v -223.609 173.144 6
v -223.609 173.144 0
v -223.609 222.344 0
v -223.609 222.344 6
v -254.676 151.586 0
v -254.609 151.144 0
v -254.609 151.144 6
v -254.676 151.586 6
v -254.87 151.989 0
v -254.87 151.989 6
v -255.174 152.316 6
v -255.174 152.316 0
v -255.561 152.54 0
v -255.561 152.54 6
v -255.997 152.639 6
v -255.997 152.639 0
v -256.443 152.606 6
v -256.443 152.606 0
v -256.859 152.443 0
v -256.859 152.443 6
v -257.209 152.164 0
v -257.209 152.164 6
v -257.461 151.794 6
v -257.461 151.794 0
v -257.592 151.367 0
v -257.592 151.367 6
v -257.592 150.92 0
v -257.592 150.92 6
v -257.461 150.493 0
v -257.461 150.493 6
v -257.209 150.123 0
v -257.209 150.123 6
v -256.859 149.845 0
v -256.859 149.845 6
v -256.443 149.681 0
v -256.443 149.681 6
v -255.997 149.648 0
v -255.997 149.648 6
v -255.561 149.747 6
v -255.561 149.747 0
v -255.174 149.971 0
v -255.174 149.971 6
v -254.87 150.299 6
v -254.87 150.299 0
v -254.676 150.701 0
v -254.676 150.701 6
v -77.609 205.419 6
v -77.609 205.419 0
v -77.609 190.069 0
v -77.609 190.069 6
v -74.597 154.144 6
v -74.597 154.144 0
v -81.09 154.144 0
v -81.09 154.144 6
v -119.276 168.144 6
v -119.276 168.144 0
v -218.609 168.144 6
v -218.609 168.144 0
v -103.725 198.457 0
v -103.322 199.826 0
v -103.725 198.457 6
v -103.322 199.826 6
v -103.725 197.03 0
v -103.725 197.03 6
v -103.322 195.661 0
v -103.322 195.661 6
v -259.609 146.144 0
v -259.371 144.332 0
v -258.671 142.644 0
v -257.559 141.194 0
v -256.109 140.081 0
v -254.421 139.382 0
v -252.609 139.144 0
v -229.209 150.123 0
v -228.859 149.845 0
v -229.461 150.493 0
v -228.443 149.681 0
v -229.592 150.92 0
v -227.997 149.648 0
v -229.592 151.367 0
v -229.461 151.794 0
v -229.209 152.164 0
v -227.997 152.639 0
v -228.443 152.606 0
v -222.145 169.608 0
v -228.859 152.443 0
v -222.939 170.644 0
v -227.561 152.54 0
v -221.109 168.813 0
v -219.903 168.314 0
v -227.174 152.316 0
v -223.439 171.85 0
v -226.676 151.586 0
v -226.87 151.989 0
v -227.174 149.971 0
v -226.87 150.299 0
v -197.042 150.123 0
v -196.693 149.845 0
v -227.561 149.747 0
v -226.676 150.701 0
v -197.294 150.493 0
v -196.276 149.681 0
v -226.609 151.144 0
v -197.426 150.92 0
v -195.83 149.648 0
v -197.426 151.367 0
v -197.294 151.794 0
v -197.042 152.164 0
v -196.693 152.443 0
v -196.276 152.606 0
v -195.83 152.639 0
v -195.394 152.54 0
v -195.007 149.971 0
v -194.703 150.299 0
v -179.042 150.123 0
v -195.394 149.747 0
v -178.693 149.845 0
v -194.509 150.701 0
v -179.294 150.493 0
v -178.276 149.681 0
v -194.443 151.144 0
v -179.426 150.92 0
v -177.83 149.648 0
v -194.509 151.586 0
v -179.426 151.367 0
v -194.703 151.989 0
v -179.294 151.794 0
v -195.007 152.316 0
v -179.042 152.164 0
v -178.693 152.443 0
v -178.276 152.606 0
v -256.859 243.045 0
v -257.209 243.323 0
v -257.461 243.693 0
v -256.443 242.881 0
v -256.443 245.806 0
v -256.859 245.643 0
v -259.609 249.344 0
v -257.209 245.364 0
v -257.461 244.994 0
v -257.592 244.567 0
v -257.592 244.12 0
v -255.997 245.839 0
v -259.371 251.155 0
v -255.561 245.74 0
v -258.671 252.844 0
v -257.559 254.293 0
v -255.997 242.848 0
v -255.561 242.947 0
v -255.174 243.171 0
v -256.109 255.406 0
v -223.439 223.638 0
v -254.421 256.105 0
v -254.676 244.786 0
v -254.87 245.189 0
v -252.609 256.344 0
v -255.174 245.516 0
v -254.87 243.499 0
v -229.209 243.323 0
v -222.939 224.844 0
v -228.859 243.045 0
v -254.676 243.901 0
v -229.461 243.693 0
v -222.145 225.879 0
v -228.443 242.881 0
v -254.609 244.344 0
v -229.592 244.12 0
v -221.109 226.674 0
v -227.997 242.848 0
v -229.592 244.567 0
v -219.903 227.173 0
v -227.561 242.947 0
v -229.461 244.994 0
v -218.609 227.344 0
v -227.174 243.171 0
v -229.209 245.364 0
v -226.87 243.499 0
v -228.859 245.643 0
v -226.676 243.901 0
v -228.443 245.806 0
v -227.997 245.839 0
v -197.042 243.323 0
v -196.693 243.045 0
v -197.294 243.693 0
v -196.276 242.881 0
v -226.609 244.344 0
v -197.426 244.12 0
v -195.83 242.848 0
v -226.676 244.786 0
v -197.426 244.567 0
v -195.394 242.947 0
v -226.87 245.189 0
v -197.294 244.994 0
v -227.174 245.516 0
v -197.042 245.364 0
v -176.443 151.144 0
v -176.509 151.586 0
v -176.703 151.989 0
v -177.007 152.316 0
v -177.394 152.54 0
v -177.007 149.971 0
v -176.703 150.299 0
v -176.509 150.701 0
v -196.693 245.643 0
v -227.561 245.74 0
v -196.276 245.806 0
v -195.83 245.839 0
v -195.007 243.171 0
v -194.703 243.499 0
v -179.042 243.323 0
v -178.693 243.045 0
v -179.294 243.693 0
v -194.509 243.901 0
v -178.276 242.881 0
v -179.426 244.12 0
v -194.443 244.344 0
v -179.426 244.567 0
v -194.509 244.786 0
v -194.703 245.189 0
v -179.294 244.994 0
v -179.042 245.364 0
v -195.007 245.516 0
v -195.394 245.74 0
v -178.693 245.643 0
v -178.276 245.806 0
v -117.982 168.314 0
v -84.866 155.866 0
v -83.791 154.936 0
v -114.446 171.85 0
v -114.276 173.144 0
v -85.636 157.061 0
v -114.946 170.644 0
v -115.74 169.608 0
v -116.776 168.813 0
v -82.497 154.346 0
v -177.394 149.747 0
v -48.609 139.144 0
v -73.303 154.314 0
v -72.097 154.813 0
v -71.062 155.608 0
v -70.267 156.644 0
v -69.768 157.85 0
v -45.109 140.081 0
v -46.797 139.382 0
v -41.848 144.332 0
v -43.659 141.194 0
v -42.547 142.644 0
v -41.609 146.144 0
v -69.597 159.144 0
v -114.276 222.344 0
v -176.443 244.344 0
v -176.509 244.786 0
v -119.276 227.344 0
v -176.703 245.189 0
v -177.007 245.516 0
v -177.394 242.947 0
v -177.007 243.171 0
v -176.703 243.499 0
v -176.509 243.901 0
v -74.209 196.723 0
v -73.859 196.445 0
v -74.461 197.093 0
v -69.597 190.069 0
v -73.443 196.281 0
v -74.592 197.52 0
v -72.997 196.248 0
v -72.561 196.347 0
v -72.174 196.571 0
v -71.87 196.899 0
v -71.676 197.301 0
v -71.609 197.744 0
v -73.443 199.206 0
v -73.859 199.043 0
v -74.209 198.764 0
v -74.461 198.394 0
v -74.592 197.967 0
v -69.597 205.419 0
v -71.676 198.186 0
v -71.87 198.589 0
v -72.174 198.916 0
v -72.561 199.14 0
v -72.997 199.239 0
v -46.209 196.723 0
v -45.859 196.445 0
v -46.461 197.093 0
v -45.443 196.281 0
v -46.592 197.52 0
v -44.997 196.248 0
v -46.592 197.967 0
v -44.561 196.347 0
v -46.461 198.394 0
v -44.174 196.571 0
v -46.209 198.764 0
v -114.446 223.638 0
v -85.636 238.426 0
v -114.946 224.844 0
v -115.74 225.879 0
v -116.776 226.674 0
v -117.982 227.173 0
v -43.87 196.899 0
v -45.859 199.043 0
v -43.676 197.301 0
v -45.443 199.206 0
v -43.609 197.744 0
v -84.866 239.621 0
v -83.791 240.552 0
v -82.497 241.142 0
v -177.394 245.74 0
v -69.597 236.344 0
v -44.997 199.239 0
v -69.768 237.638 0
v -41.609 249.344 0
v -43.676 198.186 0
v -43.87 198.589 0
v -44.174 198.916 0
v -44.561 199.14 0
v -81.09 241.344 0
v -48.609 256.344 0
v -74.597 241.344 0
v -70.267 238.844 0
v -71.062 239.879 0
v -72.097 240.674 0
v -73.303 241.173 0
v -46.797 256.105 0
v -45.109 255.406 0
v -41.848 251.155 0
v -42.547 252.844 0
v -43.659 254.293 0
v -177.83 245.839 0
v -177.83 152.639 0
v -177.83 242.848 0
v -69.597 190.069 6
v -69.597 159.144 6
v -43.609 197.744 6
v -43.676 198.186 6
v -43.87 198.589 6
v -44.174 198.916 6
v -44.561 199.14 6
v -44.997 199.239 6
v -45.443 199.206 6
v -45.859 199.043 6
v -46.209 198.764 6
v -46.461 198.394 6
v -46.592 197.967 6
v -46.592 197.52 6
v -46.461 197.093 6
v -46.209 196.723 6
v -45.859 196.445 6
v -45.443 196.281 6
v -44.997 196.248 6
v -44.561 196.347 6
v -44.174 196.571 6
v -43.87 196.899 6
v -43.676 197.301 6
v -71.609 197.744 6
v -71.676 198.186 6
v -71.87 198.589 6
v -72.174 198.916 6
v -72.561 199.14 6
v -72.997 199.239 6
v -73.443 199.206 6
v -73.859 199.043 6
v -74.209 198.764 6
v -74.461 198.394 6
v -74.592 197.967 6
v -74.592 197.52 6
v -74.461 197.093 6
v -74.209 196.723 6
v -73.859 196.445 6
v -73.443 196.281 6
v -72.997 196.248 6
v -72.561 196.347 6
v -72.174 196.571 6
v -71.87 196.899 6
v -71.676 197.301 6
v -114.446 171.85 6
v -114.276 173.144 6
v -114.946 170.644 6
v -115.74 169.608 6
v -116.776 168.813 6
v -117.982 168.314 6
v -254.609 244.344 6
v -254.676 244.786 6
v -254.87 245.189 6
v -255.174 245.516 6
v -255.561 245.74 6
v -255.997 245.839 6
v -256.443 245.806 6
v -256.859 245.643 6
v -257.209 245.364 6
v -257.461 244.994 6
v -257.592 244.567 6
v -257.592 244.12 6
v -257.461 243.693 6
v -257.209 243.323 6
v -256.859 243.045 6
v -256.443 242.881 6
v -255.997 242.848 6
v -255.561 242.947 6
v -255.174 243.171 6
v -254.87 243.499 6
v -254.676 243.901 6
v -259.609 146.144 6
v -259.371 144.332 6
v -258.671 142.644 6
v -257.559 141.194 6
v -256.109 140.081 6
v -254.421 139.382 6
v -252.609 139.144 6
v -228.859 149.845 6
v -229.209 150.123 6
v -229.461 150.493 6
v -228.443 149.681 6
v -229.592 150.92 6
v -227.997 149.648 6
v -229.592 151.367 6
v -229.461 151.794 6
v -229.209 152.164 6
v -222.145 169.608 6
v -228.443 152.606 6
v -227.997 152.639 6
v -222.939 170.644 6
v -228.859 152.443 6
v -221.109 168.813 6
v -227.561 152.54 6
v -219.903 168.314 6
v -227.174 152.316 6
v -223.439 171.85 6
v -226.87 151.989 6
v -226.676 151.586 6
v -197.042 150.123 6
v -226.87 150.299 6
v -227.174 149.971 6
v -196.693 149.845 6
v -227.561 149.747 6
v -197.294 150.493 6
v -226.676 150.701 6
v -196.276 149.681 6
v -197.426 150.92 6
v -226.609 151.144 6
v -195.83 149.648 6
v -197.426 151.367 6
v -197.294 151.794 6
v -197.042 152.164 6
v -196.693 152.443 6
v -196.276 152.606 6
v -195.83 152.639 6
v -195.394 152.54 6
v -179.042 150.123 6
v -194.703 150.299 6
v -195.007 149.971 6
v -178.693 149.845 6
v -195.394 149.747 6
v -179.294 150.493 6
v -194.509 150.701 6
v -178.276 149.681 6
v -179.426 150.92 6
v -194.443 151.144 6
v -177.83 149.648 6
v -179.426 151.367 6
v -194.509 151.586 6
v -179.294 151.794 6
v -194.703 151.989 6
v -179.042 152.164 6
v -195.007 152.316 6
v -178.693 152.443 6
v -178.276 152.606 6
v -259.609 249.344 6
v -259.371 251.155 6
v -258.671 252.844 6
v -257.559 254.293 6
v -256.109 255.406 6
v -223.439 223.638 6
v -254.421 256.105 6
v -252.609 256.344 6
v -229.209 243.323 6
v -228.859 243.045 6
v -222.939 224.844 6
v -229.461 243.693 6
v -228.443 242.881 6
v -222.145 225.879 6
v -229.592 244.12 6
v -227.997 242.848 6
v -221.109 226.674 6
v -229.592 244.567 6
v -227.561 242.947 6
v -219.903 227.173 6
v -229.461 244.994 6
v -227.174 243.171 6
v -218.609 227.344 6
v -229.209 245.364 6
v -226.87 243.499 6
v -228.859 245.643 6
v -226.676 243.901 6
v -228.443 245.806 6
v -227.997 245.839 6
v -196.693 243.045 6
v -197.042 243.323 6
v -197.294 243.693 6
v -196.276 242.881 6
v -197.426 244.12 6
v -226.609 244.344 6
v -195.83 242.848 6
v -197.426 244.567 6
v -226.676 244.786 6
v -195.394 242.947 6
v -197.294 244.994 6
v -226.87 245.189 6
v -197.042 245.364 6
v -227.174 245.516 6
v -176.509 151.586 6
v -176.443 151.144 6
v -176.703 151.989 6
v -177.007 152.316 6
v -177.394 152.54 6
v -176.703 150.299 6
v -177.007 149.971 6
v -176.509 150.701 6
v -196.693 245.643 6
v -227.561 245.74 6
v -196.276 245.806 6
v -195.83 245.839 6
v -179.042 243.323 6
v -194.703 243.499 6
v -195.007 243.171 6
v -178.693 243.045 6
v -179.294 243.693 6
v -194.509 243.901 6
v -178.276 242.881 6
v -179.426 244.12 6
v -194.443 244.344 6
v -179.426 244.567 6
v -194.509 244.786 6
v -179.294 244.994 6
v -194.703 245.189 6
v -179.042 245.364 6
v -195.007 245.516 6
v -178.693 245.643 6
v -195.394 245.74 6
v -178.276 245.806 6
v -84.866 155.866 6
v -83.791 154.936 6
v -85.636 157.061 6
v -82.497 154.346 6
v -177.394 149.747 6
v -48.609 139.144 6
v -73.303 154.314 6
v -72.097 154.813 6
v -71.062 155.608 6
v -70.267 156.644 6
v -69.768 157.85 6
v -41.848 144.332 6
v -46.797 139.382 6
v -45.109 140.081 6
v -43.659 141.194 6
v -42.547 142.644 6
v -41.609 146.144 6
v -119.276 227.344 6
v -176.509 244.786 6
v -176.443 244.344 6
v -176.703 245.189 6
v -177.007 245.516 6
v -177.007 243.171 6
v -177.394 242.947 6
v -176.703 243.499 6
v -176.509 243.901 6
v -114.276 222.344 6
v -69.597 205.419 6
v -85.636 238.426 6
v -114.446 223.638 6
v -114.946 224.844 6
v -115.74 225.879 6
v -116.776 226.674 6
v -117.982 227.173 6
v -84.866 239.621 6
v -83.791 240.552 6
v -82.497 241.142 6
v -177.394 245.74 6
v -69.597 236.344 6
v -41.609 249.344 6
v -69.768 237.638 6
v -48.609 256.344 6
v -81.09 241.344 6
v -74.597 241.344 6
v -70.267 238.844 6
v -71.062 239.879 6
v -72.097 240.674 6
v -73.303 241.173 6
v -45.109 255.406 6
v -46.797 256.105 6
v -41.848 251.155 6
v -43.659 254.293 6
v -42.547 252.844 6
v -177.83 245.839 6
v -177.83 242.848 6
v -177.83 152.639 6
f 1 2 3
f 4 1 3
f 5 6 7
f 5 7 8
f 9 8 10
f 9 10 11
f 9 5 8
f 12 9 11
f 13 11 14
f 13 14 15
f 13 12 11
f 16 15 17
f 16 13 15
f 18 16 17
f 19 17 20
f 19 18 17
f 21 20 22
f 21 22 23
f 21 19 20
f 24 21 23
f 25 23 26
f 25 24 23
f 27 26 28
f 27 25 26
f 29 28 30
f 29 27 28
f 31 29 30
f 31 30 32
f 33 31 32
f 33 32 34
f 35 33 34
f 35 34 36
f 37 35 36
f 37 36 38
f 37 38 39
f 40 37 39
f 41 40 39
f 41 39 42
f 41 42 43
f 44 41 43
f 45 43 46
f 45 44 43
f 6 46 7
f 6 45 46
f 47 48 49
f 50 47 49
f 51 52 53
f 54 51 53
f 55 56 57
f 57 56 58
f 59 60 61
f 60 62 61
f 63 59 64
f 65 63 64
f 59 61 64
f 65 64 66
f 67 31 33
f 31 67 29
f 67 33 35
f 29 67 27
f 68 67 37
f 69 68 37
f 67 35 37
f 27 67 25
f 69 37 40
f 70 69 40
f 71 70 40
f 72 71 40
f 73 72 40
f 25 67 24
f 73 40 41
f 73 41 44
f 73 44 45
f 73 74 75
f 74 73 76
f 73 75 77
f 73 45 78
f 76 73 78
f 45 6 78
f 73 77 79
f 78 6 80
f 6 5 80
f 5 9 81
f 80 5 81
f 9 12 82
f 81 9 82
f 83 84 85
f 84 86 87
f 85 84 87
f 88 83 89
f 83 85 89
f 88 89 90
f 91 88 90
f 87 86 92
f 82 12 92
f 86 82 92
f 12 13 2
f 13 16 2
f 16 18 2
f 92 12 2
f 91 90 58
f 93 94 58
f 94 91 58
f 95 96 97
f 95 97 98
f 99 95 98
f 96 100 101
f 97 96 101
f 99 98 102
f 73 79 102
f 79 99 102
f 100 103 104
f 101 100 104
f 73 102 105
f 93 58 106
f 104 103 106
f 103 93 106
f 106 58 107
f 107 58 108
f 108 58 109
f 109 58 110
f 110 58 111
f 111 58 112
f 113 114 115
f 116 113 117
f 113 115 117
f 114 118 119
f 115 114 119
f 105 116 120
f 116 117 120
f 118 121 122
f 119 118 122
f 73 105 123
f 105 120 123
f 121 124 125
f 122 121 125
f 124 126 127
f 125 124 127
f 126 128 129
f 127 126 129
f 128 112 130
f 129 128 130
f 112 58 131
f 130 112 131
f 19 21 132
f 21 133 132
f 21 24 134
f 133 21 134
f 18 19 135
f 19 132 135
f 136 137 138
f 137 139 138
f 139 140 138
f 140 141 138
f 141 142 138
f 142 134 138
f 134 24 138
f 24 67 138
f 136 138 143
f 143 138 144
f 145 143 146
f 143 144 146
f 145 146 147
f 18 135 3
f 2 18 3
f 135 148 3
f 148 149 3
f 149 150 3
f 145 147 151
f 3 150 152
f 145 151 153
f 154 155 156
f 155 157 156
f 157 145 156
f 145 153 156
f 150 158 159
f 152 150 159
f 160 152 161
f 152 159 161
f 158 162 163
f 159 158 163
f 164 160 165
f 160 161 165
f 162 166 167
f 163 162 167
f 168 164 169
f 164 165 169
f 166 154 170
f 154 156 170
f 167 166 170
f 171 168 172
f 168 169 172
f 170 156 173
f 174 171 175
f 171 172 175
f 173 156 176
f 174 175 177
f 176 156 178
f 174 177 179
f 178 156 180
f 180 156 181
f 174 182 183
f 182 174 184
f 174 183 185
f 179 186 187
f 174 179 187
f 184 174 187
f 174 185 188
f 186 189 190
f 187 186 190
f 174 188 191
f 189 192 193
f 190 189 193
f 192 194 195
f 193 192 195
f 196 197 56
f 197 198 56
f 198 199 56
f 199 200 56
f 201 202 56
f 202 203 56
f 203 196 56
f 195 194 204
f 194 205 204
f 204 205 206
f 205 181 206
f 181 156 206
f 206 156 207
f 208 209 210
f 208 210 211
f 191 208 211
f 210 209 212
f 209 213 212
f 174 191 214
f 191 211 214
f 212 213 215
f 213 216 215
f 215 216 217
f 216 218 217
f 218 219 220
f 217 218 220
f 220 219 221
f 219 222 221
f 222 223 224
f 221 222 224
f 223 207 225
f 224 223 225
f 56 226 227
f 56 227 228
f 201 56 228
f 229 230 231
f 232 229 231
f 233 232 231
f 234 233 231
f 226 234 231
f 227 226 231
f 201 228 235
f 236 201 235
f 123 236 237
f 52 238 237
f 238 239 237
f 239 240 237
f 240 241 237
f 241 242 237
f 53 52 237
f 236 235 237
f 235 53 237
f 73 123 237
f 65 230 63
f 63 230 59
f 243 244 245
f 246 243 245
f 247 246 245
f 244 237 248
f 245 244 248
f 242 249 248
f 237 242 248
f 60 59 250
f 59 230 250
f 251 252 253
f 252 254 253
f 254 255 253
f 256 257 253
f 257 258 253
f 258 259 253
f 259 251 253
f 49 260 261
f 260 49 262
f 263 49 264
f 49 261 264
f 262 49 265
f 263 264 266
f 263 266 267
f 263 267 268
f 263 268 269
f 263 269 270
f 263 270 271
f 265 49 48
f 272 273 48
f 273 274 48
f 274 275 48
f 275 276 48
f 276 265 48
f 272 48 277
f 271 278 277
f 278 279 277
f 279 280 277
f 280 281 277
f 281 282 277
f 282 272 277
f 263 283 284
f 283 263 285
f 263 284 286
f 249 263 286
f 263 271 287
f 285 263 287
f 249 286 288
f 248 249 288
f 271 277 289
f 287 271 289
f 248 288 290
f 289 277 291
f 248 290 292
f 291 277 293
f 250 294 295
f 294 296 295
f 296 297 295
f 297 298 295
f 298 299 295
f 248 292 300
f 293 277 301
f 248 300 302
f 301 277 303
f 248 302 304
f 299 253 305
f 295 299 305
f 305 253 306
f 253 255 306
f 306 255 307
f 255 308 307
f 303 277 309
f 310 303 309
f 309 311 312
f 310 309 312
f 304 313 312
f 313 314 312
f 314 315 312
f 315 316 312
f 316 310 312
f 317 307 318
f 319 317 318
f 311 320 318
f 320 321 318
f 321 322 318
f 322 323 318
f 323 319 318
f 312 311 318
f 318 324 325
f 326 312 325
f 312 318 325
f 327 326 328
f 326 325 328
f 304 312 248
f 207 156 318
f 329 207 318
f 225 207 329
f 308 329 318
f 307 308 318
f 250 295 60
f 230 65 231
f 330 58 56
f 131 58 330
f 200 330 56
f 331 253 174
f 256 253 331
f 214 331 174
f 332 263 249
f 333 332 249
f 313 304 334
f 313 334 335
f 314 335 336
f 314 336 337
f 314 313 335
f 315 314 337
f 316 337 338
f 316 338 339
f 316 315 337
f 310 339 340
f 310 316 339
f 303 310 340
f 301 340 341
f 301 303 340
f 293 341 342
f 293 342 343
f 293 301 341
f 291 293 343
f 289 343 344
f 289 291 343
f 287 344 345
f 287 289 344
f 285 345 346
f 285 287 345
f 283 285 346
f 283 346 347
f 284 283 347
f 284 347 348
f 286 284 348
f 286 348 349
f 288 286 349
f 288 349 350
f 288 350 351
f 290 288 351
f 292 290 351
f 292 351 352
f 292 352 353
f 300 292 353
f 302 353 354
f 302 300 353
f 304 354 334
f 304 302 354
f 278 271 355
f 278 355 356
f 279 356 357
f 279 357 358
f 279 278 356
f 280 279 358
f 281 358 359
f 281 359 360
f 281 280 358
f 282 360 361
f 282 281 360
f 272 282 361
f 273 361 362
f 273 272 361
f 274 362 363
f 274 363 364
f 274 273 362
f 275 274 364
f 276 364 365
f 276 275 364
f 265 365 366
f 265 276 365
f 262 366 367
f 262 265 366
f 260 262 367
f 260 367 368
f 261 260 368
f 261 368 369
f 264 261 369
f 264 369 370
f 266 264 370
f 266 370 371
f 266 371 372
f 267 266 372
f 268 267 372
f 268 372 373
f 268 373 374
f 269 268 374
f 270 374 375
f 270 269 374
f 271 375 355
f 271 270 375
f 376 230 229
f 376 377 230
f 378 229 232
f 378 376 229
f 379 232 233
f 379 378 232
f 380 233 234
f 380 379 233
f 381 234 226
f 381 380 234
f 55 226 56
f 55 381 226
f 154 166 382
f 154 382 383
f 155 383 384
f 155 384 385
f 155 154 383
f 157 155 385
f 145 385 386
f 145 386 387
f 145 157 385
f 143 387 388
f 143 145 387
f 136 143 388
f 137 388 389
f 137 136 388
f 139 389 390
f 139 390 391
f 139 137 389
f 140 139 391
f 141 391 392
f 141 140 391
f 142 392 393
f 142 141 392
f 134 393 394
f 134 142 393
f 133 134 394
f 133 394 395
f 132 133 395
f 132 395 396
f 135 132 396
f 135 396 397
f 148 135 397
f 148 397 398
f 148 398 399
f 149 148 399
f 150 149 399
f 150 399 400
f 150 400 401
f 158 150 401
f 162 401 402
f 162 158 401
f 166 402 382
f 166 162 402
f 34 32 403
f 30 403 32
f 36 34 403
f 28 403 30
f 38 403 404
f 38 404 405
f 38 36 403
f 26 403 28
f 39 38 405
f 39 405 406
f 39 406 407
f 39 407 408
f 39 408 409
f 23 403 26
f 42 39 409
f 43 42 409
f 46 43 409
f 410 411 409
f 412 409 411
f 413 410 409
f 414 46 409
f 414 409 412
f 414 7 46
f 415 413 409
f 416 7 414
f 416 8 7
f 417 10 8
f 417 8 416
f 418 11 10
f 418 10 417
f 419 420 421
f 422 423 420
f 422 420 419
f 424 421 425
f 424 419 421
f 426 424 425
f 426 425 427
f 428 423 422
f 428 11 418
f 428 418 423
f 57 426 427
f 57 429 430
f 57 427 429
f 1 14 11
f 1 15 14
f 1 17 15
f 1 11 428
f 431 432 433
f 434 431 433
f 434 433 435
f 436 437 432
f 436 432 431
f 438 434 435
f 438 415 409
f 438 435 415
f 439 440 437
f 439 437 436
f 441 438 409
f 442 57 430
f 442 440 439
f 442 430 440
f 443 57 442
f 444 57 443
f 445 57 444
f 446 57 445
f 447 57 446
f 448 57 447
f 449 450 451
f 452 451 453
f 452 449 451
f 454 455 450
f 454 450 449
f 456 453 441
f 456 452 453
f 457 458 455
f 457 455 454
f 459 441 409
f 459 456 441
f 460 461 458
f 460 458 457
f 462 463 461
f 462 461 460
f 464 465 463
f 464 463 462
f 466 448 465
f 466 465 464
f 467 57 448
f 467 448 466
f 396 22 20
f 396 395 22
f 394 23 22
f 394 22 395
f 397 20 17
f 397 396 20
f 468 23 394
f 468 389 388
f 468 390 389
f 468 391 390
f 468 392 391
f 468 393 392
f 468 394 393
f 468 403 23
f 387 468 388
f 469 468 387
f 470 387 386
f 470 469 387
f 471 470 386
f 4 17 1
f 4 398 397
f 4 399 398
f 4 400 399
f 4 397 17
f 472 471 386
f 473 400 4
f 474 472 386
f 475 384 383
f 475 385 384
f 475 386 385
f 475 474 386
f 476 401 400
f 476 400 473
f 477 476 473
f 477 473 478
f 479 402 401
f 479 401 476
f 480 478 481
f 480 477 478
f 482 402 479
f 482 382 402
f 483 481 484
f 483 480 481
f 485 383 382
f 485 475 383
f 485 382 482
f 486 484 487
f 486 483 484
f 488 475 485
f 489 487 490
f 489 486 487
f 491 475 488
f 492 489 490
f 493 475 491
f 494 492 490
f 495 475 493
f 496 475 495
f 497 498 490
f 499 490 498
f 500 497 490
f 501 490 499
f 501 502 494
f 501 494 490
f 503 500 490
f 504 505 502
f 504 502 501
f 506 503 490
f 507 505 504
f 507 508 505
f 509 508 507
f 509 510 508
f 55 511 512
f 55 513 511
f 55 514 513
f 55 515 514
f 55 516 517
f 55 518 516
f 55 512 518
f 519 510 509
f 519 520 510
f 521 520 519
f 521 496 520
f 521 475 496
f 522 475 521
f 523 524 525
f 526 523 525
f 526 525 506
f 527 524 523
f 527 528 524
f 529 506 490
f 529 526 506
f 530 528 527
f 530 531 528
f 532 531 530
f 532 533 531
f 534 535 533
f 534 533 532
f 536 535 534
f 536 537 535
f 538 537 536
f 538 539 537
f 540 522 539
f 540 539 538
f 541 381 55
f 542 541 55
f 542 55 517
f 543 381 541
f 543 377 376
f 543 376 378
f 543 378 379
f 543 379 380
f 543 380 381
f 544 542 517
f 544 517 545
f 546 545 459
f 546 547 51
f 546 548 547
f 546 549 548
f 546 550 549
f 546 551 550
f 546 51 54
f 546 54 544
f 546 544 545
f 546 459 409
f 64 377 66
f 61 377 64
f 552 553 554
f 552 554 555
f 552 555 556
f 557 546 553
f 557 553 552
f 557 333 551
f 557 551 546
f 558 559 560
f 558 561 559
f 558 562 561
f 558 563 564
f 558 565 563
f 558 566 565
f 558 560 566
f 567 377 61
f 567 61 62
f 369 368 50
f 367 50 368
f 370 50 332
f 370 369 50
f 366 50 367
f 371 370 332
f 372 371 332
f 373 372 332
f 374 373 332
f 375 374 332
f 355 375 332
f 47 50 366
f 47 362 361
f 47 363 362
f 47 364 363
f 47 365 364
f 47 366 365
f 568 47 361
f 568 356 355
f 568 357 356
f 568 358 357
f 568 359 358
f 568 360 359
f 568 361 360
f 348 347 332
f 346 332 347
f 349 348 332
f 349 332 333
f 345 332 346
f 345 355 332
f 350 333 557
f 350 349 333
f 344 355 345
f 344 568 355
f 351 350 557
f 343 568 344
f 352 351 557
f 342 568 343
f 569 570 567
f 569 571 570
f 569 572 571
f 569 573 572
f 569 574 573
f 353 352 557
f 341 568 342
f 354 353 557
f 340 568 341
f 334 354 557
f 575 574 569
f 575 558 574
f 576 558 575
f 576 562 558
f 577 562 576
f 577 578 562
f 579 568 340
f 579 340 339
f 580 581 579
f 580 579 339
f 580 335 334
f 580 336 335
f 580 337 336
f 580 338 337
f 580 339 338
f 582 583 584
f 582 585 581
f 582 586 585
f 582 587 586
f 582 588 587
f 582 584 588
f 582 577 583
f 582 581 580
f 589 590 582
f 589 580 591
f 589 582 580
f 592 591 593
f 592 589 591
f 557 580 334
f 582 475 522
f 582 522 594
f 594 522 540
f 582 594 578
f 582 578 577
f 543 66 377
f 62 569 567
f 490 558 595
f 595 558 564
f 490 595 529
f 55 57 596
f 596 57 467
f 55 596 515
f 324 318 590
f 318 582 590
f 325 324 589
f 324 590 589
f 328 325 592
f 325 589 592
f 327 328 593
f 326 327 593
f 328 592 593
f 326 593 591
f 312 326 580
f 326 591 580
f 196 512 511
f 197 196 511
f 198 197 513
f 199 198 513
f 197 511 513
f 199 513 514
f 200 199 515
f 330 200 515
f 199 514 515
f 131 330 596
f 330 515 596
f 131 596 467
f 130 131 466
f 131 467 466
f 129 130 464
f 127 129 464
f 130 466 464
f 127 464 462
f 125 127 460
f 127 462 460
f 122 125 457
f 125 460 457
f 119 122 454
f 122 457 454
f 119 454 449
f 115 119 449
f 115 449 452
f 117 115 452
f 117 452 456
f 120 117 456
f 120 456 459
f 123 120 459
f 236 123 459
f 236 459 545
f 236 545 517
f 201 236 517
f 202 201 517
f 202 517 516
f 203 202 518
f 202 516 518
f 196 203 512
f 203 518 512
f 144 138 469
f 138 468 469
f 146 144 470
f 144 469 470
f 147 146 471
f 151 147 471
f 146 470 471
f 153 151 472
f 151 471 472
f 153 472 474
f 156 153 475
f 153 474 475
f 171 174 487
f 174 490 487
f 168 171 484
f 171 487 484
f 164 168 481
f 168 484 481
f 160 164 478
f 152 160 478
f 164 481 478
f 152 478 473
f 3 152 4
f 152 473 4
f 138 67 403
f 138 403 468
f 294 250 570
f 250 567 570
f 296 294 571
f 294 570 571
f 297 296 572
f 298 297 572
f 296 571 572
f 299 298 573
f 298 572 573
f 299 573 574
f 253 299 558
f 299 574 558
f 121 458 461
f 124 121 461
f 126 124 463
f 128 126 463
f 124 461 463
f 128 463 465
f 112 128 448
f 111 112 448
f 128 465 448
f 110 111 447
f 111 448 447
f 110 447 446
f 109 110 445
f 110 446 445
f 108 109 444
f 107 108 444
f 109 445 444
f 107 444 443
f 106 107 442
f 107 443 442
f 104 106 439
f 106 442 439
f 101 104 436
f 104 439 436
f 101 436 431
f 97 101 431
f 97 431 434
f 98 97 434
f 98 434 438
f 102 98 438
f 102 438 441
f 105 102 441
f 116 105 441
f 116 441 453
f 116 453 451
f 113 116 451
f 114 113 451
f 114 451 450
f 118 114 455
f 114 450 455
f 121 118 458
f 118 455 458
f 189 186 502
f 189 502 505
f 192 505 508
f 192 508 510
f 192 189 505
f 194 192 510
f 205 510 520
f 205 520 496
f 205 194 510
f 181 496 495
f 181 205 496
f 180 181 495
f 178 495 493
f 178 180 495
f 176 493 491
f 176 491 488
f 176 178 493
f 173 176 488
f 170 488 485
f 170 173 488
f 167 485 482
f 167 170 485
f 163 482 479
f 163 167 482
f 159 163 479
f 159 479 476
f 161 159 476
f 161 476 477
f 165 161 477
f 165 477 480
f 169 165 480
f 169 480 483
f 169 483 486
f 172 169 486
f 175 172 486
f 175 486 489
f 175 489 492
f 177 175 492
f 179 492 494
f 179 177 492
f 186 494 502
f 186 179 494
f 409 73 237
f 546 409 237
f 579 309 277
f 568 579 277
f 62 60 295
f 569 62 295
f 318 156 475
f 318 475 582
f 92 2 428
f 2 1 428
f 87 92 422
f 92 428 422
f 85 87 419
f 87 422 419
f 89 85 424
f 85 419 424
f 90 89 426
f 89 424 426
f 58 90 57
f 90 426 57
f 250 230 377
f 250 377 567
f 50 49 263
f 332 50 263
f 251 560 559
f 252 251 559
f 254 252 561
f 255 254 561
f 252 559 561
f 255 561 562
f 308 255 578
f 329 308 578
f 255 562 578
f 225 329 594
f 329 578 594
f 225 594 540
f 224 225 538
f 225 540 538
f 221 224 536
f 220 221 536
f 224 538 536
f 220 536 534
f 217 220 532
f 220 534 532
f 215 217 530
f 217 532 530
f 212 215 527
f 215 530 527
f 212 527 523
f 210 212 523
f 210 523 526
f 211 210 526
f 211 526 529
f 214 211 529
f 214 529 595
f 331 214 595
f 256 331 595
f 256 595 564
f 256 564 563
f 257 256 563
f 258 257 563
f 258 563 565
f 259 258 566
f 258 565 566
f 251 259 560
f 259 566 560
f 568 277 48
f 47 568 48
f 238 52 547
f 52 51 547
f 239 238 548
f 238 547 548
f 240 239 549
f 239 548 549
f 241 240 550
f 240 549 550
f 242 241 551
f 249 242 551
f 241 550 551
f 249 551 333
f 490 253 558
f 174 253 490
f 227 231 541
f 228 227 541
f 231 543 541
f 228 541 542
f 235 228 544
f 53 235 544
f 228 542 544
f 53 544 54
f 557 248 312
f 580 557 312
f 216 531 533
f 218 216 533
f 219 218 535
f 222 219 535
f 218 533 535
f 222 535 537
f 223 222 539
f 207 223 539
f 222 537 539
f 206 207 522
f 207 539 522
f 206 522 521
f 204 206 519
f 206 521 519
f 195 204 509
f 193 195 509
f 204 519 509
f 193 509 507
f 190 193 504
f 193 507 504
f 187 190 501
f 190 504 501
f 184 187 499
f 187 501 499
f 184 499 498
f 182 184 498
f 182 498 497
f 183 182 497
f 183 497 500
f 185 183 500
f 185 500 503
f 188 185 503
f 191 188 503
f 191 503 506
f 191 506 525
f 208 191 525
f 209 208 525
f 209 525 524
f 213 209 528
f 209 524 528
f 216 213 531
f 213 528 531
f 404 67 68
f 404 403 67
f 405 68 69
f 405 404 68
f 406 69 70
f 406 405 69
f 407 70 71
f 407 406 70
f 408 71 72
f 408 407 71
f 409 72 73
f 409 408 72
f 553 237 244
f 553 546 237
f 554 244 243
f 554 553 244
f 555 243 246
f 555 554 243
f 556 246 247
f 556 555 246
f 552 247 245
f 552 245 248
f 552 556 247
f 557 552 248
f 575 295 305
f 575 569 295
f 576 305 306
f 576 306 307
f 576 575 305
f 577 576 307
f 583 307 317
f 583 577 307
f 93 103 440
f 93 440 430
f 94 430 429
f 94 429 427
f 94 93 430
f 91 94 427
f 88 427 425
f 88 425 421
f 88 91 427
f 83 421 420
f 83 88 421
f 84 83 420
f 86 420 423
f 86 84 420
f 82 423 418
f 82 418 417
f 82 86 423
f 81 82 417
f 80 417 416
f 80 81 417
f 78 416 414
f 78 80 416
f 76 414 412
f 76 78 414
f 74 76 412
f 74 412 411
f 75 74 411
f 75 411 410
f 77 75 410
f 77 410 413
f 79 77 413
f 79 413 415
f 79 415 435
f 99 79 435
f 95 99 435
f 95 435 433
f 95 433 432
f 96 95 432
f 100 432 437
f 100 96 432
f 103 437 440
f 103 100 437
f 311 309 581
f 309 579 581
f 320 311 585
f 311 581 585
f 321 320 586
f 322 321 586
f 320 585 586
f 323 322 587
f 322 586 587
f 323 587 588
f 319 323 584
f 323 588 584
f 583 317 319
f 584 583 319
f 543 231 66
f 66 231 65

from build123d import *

# Parameters (mm, degrees)
SKETCH1_W           = 218
SKETCH1_H           = 117.2
SKETCH1_R           = 1.5
BOSS_EXTRUDE1_DEPTH = 6
SKETCH2_R           = 1.5
CUT_EXTRUDE1_DEPTH  = 6
FILLET1_R           = 7
SKETCH3_W           = 109.333333333
SKETCH3_H           = 59.2
CUT_EXTRUDE2_DEPTH  = 10
FILLET3_R           = 5
CUT_EXTRUDE3_DEPTH  = 10
FILLET4_R           = 5


with BuildPart() as part:
    # Sketch1 → Boss-Extrude1 (new body)
    with BuildSketch(Plane.XY):
        with Locations((-150.609177744, 197.743600407)):
            Rectangle(SKETCH1_W, SKETCH1_H)
        with Locations((-256.109177744, 244.343600407)):
            Circle(SKETCH1_R, mode=Mode.SUBTRACT)
        with Locations((-256.109177744, 151.143600407)):
            Circle(SKETCH1_R, mode=Mode.SUBTRACT)
        with Locations((-45.109177744, 197.743600407)):
            Circle(SKETCH1_R, mode=Mode.SUBTRACT)
        with Locations((-73.109177744, 197.743600407)):
            Circle(SKETCH1_R, mode=Mode.SUBTRACT)
        with Locations((-228.109177744, 244.343600407)):
            Circle(SKETCH1_R, mode=Mode.SUBTRACT)
        with Locations((-228.109177744, 151.143600407)):
            Circle(SKETCH1_R, mode=Mode.SUBTRACT)
    extrude(amount=BOSS_EXTRUDE1_DEPTH)

    # Sketch2 → Cut-Extrude1 (cut)
    with BuildSketch(Plane.XY.offset(6)):
        with Locations((-195.942511077, 151.143600407)):
            Circle(SKETCH2_R)
        with Locations((-177.942511077, 151.143600407)):
            Circle(SKETCH2_R)
        with Locations((-195.942511077, 244.343600407)):
            Circle(SKETCH2_R)
        with Locations((-177.942511077, 244.343600407)):
            Circle(SKETCH2_R)
    extrude(amount=-CUT_EXTRUDE1_DEPTH, mode=Mode.SUBTRACT)

    # Fillet1
    fillet1_edges = [part.edges().sort_by_distance(p)[0] for p in [
        (-259.609177744, 256.343600407, 3),
        (-41.609177744, 256.343600407, 3),
        (-41.609177744, 139.143600407, 3),
        (-259.609177744, 139.143600407, 3),
    ]]
    fillet(fillet1_edges, radius=FILLET1_R)

    # Sketch3 → Cut-Extrude2 (cut)
    with BuildSketch(Plane(origin=(0, 0, 0), x_dir=(-1, 0, 0), z_dir=(0, 0, -1))):
        with Locations((168.942511078, 197.743600407)):
            Rectangle(SKETCH3_W, SKETCH3_H)
    extrude(amount=-CUT_EXTRUDE2_DEPTH, mode=Mode.SUBTRACT)

    # Fillet3
    fillet3_edges = [part.edges().sort_by_distance(p)[0] for p in [
        (-114.275844411, 168.143600407, 3),
        (-114.275844411, 227.343600407, 3),
        (-223.609177744, 227.343600407, 3),
        (-223.609177744, 168.143600407, 3),
    ]]
    fillet(fillet3_edges, radius=FILLET3_R)

    # Sketch4 → Cut-Extrude3 (cut)
    with BuildSketch(Plane(origin=(0, 0, 0), x_dir=(-1, 0, 0), z_dir=(0, 0, -1))):
        Polygon((84.298987117, 241.343600407), (69.597266226, 241.343600407), (69.597266226, 205.418600407), (77.609177744, 205.418600407), (77.609177744, 190.068600407), (69.597266226, 190.068600407), (69.597266226, 154.143600407), (84.298987117, 154.143600407), (104.275844411, 197.743600407), align=None)
    extrude(amount=-CUT_EXTRUDE3_DEPTH, mode=Mode.SUBTRACT)

    # Fillet4
    fillet4_edges = [part.edges().sort_by_distance(p)[0] for p in [
        (-69.597266226, 241.343600407, 3),
        (-84.298987117, 241.343600407, 3),
        (-104.275844411, 197.743600407, 3),
        (-84.298987117, 154.143600407, 3),
        (-69.597266226, 154.143600407, 3),
    ]]
    fillet(fillet4_edges, radius=FILLET4_R)


solid = part.part
